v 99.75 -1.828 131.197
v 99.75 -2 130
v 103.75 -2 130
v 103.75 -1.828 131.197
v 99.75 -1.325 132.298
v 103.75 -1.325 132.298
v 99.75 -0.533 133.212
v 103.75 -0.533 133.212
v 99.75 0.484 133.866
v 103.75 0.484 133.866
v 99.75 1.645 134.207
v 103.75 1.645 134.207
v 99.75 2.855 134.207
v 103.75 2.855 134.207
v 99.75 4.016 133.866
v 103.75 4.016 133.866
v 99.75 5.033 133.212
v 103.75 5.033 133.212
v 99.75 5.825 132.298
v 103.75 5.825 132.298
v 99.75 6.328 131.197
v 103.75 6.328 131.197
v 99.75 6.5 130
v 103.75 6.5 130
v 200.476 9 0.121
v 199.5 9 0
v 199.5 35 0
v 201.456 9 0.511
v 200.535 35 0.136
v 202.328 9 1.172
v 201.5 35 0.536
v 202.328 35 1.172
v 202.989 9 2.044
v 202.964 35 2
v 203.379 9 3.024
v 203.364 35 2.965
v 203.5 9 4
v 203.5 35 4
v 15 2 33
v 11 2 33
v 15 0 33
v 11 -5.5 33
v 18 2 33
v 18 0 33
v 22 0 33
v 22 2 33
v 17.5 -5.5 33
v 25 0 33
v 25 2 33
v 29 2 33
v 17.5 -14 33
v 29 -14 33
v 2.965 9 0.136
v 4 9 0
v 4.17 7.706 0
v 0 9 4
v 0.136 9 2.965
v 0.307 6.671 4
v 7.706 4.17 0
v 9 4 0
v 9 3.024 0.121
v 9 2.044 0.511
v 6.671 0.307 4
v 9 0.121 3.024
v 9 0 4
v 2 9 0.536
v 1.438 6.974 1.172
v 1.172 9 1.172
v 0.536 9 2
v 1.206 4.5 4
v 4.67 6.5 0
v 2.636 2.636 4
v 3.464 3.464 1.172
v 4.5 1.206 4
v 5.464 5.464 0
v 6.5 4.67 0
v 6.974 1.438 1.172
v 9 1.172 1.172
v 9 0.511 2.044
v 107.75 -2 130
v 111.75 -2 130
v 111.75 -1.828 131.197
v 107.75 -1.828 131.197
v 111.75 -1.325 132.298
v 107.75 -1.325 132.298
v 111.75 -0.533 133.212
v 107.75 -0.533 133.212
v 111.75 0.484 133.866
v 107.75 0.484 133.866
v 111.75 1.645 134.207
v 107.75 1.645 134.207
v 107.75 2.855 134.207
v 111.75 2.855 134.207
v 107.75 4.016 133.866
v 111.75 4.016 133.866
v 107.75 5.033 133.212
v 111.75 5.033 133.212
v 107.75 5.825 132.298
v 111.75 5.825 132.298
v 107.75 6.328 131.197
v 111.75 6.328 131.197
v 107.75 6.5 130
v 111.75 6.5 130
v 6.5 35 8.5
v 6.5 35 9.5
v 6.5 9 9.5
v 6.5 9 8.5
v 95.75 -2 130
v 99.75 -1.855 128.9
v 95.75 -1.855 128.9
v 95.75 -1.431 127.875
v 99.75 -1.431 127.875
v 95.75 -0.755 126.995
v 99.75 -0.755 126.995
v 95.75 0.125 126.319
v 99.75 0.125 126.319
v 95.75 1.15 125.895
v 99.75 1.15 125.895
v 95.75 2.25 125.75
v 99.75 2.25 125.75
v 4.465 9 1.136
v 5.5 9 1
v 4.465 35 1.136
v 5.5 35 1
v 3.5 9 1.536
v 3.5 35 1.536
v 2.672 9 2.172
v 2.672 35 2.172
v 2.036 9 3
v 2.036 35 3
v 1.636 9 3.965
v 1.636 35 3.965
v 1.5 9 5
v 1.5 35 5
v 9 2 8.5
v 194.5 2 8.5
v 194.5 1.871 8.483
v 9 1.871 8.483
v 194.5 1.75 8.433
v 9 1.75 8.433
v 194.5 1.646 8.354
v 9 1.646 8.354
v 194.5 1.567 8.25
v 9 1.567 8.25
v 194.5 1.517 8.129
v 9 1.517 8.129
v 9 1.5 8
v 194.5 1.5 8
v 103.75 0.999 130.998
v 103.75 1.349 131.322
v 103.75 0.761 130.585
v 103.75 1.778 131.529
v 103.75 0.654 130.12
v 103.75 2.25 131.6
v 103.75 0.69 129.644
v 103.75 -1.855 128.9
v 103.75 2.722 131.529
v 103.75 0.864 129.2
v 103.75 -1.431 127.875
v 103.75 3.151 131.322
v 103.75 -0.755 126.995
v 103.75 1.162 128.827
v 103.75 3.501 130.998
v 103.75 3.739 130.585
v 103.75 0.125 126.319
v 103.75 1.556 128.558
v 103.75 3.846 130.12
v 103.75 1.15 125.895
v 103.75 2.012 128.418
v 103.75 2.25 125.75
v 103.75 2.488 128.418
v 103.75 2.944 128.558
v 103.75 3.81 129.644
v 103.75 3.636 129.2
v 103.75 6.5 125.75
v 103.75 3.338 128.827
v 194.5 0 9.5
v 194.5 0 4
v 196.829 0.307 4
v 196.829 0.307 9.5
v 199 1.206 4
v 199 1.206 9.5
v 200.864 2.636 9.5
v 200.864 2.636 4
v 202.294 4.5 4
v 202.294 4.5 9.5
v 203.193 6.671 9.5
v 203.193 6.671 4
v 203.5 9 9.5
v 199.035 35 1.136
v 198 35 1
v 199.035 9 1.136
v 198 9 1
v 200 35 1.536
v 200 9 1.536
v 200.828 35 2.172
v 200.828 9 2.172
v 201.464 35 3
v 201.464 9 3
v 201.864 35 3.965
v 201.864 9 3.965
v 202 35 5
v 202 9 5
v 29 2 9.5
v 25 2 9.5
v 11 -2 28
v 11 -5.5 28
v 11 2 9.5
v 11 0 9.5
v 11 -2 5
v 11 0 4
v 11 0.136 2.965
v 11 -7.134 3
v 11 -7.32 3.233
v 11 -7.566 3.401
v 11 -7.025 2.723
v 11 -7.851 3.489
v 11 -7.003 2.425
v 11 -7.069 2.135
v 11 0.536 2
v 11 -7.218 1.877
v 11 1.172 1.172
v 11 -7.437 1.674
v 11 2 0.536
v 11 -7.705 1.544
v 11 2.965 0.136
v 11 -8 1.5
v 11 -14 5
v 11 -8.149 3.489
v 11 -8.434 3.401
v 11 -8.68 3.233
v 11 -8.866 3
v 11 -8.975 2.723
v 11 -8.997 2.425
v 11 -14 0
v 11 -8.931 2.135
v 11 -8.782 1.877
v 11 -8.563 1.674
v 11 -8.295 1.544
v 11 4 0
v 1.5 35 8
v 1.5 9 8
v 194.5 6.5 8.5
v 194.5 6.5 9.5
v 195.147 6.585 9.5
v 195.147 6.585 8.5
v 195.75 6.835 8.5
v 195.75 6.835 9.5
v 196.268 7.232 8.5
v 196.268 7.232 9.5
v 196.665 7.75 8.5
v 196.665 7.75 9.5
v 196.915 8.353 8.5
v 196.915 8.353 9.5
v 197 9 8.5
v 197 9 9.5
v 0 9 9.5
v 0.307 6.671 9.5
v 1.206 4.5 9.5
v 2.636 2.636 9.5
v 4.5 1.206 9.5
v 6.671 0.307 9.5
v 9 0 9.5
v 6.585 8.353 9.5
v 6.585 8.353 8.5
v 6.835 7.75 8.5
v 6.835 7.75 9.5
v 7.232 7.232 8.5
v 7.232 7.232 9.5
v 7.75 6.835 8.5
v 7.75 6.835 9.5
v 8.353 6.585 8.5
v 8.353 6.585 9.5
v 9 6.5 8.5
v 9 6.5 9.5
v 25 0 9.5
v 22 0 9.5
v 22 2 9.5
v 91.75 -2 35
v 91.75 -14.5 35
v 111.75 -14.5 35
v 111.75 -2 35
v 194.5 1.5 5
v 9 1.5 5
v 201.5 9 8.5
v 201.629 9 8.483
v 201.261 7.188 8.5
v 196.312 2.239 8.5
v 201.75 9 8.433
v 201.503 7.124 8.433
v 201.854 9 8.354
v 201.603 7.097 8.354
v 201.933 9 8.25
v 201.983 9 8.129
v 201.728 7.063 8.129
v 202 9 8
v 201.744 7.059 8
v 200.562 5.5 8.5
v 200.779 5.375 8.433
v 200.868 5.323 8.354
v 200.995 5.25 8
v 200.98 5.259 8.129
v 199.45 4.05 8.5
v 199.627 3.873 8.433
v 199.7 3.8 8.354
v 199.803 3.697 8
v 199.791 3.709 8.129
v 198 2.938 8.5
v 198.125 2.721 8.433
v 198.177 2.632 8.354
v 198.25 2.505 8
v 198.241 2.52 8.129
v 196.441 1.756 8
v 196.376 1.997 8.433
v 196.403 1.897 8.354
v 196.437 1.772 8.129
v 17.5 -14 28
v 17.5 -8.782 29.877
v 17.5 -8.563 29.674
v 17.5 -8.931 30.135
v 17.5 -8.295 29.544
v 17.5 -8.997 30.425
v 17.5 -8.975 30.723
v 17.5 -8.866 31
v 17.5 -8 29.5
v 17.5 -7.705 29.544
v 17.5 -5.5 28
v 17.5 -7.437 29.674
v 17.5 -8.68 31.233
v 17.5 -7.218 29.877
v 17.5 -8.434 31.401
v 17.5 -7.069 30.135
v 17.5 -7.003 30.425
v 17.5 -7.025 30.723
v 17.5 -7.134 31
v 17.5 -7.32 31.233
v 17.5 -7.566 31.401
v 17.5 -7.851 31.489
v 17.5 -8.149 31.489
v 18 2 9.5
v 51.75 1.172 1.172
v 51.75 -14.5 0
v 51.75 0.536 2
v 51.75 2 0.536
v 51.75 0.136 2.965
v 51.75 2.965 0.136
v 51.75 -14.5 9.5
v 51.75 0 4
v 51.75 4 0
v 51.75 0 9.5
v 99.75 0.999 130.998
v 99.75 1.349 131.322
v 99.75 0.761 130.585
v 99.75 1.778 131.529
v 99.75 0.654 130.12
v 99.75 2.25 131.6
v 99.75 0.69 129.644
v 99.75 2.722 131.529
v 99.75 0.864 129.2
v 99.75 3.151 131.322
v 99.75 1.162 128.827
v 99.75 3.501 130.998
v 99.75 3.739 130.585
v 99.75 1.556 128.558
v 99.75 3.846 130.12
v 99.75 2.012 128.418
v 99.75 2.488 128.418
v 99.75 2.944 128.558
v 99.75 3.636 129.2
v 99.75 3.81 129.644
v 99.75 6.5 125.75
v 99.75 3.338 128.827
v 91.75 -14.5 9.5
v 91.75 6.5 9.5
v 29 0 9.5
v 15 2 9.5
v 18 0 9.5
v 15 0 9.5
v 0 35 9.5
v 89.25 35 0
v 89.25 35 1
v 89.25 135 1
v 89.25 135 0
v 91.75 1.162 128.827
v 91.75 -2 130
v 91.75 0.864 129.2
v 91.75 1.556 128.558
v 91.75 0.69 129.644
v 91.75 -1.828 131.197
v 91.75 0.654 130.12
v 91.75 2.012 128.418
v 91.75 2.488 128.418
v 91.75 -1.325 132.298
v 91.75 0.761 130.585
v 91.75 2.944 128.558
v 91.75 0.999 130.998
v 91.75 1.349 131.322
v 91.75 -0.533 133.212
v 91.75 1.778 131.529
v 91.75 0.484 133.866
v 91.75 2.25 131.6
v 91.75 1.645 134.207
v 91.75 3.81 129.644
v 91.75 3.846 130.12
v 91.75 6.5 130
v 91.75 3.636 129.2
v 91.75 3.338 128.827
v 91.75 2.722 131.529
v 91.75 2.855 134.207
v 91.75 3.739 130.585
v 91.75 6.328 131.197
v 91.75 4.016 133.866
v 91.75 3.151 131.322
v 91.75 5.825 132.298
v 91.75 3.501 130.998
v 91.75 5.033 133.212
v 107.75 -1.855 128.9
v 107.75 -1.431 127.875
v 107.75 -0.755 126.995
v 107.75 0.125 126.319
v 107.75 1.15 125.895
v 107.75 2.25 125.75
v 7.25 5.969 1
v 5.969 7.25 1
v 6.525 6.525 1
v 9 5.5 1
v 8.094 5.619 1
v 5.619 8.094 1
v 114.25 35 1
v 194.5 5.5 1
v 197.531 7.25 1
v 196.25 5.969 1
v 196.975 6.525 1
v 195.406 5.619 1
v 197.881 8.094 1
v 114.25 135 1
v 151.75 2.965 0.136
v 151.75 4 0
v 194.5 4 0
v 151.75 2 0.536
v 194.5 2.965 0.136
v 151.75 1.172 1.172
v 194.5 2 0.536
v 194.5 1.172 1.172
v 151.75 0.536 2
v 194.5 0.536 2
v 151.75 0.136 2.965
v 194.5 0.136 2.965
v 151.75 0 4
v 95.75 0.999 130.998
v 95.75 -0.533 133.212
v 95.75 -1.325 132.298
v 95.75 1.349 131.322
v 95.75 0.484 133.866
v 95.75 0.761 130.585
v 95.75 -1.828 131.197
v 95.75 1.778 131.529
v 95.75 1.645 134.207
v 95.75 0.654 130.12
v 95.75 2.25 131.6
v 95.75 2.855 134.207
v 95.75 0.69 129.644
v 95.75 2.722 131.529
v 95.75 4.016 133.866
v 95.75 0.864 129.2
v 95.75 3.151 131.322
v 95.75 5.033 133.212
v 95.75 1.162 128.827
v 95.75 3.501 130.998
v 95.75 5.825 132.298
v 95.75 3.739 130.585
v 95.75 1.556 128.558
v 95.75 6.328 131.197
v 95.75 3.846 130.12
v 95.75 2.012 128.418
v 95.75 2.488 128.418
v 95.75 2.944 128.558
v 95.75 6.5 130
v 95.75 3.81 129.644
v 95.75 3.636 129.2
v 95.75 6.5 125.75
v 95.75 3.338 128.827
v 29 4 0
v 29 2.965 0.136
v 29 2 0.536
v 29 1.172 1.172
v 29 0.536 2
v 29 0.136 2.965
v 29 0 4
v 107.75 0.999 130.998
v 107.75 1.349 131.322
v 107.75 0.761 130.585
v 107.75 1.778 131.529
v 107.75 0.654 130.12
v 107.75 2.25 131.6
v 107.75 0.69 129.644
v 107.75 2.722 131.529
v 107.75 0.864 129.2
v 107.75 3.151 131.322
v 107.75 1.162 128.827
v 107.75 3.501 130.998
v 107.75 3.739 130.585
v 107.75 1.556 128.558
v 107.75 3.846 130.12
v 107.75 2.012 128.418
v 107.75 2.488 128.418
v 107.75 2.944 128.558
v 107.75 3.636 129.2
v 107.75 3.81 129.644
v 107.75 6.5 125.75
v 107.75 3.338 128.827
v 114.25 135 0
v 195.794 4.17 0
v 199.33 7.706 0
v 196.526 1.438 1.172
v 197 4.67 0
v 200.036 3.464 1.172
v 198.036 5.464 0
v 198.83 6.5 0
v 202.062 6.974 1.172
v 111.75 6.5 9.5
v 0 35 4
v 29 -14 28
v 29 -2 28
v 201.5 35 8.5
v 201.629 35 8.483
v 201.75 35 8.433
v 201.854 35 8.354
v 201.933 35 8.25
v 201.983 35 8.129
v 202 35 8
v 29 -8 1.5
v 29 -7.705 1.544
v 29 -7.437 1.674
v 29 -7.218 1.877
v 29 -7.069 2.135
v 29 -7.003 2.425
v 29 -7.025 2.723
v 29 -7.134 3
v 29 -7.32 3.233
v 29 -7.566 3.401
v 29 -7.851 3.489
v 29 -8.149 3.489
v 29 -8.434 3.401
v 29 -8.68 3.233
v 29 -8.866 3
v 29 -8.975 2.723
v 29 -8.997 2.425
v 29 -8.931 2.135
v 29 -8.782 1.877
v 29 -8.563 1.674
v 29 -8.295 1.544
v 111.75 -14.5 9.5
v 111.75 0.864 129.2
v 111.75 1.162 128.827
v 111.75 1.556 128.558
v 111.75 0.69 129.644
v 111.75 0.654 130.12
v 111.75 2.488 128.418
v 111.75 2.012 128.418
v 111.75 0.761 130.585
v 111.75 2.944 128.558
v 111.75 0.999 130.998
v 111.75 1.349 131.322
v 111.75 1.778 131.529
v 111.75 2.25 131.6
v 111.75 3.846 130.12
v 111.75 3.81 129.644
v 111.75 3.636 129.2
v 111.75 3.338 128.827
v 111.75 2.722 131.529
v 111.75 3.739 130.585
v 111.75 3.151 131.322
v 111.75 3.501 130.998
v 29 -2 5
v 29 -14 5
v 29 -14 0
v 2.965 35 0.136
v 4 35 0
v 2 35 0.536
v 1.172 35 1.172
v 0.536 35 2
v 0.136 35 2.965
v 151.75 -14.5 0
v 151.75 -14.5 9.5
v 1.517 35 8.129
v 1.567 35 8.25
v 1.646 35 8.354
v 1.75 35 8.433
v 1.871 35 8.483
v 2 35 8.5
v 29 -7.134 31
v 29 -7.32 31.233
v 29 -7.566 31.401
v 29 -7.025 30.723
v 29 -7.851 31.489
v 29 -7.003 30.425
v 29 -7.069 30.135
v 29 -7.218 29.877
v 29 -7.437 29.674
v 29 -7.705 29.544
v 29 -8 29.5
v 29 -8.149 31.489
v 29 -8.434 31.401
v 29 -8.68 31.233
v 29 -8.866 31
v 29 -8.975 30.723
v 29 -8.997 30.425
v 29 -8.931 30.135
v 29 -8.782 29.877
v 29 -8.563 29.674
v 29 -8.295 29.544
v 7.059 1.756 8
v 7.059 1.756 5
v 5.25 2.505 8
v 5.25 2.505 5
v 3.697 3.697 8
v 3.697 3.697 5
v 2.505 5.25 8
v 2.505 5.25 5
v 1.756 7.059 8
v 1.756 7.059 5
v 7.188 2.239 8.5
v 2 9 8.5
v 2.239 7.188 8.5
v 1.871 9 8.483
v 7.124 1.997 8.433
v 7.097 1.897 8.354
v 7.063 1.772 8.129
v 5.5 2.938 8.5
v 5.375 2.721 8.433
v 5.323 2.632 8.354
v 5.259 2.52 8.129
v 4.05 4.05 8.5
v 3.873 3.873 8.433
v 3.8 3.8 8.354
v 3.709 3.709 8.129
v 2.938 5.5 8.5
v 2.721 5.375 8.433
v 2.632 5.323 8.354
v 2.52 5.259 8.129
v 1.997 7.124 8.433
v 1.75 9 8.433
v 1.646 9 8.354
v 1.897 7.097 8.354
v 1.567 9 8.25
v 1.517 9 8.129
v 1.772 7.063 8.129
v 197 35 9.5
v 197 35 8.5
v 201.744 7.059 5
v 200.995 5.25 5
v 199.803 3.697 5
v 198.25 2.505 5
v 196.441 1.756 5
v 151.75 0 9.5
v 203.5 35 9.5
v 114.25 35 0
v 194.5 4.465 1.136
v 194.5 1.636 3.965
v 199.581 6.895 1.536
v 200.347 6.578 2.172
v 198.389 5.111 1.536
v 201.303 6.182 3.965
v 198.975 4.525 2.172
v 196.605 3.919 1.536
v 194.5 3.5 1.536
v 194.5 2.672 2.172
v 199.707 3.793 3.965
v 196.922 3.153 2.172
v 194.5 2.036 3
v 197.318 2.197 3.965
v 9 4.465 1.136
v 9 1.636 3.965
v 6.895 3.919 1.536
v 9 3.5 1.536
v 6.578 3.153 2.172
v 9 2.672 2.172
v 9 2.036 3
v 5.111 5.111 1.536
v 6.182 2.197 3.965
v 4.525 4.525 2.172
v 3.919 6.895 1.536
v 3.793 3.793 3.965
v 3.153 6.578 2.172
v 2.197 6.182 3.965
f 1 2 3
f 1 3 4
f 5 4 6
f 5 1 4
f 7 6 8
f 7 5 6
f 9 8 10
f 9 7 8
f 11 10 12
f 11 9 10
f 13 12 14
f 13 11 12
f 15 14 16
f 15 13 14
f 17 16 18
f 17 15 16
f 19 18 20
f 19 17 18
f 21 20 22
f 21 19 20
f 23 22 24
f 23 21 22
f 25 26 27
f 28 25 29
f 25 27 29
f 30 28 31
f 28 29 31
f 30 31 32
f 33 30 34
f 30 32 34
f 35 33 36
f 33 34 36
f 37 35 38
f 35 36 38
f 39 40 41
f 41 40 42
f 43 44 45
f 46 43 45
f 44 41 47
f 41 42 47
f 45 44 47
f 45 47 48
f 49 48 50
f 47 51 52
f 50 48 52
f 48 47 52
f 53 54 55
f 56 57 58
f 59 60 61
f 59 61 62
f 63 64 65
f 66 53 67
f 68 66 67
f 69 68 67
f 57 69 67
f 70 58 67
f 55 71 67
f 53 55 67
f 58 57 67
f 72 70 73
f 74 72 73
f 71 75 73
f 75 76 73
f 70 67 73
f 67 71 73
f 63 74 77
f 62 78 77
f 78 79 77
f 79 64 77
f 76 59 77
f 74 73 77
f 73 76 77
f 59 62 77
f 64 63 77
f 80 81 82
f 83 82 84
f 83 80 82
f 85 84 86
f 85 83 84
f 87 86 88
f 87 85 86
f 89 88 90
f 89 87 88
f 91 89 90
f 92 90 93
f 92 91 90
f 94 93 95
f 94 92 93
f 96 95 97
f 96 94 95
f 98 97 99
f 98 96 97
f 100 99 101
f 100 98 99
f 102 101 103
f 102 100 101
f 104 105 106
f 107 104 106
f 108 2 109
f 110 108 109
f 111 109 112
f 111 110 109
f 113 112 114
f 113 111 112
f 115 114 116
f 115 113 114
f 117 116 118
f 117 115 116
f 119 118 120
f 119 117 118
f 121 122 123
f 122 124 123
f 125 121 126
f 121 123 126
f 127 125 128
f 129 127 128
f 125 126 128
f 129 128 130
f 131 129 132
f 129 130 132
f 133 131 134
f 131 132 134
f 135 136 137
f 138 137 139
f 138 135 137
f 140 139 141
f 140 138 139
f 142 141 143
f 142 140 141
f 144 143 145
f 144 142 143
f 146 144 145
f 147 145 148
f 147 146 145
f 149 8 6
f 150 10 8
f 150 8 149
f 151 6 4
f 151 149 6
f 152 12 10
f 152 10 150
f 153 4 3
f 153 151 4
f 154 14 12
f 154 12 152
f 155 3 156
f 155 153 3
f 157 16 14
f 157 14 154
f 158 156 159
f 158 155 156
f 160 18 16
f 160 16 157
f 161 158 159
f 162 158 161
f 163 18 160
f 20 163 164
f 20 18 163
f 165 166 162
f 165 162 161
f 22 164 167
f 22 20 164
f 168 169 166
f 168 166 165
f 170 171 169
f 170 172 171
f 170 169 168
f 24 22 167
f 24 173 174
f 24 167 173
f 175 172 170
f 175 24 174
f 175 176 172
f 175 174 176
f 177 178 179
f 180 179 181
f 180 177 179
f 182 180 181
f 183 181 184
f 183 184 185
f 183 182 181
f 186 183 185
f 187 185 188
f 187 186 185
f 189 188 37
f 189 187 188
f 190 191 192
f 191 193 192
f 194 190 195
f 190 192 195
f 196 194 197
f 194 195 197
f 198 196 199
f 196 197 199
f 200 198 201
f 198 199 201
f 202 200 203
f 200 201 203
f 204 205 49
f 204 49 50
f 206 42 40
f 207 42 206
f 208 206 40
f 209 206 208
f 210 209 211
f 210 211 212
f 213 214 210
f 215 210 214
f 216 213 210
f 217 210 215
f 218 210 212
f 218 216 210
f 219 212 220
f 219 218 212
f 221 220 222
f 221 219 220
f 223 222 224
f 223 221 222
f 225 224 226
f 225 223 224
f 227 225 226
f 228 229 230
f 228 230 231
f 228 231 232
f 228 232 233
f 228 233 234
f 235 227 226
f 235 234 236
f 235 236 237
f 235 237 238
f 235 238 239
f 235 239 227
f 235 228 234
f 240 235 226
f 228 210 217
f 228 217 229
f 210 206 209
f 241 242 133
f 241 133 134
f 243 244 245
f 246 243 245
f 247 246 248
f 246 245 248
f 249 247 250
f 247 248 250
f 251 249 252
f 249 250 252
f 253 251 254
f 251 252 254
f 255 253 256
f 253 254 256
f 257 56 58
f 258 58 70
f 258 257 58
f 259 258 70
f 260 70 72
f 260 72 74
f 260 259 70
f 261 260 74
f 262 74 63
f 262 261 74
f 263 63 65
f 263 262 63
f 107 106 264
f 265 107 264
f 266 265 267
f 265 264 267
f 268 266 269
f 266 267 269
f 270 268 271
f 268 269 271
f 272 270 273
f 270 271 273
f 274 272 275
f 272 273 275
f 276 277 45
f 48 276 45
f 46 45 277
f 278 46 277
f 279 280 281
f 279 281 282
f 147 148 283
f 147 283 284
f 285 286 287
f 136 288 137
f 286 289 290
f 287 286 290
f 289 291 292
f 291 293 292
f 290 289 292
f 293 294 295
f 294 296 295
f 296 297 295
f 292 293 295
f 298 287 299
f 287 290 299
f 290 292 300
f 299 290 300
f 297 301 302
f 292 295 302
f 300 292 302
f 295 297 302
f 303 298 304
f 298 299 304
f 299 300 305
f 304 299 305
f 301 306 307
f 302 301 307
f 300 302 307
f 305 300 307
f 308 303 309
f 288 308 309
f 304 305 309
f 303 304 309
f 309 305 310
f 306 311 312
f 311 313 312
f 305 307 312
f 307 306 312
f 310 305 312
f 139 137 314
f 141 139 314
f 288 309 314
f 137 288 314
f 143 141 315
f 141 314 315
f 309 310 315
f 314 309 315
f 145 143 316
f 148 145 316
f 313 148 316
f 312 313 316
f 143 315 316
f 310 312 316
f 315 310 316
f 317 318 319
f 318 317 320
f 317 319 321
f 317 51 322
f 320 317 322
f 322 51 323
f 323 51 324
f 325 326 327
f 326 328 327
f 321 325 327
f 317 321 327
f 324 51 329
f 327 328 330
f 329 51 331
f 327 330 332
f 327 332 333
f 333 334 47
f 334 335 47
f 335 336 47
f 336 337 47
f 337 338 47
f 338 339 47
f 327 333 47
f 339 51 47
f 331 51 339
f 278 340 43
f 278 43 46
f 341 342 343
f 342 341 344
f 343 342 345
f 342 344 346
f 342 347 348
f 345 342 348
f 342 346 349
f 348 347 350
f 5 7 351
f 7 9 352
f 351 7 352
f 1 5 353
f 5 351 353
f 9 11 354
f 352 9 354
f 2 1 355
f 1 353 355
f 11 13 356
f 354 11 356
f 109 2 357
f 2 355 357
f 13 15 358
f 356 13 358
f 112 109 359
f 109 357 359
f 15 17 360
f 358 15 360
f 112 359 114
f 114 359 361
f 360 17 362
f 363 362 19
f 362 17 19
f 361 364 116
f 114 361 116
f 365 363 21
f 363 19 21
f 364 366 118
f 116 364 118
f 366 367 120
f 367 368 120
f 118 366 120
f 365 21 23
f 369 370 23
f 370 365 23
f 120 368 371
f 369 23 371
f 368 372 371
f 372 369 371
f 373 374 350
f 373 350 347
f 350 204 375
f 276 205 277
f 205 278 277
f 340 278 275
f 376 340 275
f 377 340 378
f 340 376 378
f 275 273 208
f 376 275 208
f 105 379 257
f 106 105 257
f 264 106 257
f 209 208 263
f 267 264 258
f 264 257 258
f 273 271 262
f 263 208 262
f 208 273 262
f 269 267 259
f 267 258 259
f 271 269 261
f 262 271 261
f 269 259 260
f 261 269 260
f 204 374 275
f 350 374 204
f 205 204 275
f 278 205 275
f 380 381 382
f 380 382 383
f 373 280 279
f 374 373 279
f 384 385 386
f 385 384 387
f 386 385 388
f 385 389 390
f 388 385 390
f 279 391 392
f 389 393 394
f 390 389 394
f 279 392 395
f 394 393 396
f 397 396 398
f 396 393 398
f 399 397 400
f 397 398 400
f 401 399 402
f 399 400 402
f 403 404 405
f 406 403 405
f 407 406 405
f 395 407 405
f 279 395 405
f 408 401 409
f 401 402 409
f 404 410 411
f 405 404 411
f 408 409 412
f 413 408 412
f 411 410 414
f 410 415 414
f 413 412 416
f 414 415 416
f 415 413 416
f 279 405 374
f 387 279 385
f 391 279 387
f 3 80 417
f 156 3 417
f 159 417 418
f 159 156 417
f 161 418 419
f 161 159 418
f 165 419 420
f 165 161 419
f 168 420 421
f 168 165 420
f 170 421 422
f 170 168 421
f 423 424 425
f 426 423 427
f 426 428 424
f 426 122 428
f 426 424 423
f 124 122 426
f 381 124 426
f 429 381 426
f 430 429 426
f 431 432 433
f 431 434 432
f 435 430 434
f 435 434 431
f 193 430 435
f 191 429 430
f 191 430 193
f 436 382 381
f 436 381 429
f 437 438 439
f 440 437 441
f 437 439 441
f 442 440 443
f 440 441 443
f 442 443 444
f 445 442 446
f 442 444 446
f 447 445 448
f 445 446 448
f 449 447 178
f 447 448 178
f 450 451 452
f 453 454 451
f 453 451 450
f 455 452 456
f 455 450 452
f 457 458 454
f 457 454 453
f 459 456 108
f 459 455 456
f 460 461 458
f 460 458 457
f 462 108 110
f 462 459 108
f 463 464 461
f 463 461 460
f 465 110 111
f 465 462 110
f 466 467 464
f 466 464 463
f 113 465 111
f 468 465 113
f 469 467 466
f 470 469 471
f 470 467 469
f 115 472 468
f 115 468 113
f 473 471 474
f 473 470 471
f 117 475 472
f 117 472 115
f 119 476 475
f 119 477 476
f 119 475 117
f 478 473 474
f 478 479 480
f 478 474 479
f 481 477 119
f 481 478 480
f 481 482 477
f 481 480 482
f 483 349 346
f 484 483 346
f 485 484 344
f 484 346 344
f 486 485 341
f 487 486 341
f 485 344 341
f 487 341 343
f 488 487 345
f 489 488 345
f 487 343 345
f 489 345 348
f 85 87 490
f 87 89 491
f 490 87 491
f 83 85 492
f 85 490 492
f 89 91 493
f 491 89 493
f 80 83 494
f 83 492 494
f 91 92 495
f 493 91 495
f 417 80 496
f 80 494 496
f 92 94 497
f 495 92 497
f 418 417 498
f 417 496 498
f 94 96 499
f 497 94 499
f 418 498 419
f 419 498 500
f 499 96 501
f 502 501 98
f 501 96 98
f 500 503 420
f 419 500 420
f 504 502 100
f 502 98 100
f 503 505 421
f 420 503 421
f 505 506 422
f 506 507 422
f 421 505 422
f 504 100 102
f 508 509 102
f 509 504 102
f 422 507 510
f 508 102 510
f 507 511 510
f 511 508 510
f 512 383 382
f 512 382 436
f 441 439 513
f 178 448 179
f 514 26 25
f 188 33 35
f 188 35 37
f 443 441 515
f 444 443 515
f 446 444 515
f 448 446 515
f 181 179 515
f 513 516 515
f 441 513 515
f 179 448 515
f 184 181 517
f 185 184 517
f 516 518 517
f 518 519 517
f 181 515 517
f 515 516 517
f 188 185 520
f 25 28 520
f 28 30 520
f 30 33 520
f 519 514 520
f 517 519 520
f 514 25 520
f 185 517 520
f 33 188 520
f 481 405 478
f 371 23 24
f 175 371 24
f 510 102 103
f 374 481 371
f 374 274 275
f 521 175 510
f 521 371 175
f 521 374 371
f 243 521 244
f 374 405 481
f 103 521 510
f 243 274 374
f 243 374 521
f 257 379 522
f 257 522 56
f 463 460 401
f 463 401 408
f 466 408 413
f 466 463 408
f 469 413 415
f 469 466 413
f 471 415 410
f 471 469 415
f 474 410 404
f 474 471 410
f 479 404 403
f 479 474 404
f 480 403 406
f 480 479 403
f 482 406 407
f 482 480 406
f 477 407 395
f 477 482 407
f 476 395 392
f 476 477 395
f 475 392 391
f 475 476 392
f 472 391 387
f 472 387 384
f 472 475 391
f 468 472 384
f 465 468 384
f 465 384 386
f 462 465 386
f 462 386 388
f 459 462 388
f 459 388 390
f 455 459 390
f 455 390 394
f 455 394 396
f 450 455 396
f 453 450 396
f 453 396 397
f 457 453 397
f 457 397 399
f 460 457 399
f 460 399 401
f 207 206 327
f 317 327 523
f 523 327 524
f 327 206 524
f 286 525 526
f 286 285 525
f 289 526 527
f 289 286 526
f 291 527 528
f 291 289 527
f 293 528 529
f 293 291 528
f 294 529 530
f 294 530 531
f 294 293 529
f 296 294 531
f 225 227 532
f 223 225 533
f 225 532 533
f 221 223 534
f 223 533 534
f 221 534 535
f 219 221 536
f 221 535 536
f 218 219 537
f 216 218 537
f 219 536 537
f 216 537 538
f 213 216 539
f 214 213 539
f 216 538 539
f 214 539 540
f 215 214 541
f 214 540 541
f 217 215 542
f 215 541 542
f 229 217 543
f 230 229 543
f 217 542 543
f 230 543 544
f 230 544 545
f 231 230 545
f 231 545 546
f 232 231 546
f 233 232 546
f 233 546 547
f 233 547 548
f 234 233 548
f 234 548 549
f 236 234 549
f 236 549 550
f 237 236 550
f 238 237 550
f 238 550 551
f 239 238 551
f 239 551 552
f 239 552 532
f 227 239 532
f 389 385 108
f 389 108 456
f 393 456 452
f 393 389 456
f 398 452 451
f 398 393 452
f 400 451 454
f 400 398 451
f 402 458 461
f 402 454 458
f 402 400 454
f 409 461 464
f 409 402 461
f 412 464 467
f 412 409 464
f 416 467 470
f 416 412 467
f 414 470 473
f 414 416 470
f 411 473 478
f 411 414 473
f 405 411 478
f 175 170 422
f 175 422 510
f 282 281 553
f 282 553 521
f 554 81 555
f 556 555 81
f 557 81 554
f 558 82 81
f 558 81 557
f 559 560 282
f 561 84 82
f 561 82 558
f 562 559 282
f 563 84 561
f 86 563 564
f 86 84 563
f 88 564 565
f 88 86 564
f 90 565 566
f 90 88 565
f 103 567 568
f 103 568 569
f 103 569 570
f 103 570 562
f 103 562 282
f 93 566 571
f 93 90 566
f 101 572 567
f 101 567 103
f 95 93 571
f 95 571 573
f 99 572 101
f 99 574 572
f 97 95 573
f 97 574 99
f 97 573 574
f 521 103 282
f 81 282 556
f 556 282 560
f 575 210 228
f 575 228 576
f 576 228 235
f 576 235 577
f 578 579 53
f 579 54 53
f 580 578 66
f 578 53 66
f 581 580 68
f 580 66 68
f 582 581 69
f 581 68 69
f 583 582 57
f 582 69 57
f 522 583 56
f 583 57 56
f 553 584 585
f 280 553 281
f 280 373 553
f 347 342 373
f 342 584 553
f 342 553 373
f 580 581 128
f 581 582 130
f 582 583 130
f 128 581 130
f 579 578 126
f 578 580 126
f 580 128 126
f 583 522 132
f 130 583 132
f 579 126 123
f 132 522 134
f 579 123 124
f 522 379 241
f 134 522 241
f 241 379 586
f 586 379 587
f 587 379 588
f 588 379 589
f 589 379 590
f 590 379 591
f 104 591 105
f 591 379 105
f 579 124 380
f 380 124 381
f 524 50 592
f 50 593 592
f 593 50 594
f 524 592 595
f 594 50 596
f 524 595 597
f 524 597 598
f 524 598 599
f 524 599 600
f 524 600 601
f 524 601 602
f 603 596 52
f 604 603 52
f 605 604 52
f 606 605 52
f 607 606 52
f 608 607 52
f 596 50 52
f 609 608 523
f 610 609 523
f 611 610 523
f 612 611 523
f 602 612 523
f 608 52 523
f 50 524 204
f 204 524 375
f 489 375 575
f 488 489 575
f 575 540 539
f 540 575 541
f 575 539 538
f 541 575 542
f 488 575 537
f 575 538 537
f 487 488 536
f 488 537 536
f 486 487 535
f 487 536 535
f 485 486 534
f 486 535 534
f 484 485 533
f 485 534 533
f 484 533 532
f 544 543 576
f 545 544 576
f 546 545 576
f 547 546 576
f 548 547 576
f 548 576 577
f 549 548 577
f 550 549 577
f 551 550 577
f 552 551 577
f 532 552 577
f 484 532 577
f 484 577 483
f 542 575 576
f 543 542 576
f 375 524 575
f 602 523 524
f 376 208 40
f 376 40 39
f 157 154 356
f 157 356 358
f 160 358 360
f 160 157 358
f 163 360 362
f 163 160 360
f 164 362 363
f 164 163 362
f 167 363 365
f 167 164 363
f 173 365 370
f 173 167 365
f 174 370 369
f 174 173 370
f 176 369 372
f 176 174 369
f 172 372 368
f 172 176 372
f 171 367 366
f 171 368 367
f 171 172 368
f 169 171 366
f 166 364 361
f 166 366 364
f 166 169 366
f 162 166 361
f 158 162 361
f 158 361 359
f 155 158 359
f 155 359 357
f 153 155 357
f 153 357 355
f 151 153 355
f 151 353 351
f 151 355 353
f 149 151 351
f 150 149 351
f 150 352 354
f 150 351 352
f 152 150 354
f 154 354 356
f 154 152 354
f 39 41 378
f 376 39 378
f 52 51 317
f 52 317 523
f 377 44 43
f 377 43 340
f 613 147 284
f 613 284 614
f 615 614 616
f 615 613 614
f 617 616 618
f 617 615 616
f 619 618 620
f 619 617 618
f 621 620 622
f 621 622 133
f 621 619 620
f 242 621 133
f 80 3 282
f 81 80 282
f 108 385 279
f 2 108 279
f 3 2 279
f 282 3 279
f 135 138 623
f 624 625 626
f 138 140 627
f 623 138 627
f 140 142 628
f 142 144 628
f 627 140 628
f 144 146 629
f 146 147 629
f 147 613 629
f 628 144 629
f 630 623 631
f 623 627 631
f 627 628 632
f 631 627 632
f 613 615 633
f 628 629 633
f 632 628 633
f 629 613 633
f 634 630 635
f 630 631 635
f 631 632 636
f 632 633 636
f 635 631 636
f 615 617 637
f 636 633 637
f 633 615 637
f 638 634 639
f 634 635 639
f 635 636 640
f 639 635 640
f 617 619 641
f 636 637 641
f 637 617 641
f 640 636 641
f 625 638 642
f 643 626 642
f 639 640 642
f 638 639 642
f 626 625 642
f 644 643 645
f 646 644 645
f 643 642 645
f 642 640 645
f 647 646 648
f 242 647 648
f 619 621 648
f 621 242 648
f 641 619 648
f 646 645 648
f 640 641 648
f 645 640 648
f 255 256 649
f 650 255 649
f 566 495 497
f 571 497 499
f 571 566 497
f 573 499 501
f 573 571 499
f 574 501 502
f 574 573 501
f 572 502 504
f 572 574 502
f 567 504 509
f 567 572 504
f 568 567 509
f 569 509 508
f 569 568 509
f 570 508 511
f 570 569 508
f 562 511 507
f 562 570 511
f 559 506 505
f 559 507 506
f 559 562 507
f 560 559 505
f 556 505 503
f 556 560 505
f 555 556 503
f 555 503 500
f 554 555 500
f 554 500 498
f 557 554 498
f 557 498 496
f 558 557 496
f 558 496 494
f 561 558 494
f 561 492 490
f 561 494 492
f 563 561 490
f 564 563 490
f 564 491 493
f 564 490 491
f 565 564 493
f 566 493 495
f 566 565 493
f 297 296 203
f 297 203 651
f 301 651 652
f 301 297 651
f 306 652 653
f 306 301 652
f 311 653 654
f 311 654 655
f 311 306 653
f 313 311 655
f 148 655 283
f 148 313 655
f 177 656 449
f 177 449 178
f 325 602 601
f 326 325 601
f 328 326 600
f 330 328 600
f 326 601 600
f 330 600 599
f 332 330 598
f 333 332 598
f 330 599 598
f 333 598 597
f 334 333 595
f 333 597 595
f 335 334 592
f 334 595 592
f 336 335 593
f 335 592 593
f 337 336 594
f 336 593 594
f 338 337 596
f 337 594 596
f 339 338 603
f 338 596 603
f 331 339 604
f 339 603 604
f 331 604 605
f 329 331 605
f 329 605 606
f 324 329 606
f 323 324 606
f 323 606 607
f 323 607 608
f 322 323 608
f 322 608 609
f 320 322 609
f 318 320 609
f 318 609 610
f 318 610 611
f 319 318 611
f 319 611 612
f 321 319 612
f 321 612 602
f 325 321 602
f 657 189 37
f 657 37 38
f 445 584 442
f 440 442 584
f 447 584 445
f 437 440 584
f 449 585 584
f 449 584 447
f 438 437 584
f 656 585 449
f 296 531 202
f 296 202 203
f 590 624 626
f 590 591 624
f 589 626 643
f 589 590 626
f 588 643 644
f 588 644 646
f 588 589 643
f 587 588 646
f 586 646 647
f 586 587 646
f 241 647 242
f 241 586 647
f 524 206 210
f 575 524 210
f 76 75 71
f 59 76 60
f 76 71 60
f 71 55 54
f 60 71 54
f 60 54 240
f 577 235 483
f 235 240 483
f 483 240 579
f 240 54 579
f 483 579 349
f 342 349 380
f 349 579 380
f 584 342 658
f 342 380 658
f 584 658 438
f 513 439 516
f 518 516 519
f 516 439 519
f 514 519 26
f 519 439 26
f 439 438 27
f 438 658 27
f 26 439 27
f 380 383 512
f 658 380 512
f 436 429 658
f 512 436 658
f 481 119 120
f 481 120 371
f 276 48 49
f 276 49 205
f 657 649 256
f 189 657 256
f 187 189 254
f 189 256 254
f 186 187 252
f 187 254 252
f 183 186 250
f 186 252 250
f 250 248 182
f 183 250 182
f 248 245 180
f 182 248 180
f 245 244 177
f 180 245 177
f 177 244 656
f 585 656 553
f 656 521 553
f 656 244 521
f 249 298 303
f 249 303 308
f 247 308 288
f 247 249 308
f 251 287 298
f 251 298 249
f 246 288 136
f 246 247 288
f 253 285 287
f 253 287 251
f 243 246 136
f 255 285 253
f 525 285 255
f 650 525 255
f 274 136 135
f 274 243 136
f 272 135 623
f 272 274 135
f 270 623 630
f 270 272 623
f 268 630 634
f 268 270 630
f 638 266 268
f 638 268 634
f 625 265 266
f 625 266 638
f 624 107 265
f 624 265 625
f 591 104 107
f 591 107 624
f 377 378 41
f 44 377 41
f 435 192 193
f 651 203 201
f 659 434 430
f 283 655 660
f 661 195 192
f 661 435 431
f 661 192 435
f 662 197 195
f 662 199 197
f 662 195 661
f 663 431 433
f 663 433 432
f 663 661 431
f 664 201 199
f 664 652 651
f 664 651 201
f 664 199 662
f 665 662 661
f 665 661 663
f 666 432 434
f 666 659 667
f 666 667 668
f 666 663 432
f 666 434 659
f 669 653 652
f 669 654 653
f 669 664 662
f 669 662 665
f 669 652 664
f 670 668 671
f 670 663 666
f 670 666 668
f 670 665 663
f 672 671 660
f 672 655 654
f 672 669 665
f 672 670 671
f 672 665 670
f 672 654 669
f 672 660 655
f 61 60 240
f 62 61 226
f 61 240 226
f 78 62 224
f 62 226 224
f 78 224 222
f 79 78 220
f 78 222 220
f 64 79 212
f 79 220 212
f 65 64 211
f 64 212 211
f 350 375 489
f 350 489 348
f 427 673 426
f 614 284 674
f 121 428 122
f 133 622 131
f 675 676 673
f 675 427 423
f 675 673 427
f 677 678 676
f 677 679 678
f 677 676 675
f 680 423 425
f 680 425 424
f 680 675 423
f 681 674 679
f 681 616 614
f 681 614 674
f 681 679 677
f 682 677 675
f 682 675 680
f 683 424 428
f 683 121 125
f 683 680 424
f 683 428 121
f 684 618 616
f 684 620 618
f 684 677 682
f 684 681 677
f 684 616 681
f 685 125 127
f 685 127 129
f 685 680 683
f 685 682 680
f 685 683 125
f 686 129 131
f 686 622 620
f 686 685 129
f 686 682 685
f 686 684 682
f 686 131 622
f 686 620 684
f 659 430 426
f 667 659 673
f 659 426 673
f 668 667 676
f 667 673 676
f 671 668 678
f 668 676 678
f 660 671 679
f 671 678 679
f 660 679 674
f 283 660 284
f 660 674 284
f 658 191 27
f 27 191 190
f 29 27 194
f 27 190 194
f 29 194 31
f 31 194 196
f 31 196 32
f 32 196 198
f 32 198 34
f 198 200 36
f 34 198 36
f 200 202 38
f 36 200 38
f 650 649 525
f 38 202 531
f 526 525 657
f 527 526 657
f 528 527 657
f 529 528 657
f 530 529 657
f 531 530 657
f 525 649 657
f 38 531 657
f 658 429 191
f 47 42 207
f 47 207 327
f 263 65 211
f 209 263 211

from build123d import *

# Parameters (mm, degrees)
ESQUISSE1_W                    = 203.5
ESQUISSE1_H                    = 35
BOSS_EXTRU_1_DEPTH             = 1
CONG_1_R                       = 9
BOSS_EXTRU_2_START             = 8.5
BOSS_EXTRU_2_DEPTH             = 8.5
BOSS_EXTRU_3_DEPTH             = 1
CONG_2_R                       = 4
CONG_3_R                       = 0.5
BOSS_EXTRU_4_START             = 91.75
BOSS_EXTRU_4_DEPTH             = 20
ESQUISSE8_W                    = 20
ESQUISSE8_H                    = 120.5
BOSS_EXTRU_5_DEPTH             = 6.5
ESQUISSE9_R                    = 4.25
BOSS_EXTRU_6_DEPTH             = 20
BOSS_EXTRU_10_START            = 51.75
BOSS_EXTRU_10_DEPTH            = 100
BOSS_EXTRU_10_START_2          = 91.75
BOSS_EXTRU_10_2_OUTLINE_W      = 12.5
BOSS_EXTRU_10_2_OUTLINE_H      = 25.5
BOSS_EXTRU_10_2_DEPTH          = 20
ESQUISSE21_W                   = 25
ESQUISSE21_H                   = 1
BOSS_EXTRU_11_DEPTH            = 100
ENL_V_MAT_EXTRU_2_DEPTH        = 4
R_P_TITION_LIN_AIRE2_COUNT     = 2
R_P_TITION_LIN_AIRE2_PITCH     = 8
ENL_V_START                    = -20
ESQUISSE12_R                   = 1.6
ENL_V_MAT_EXTRU_4_DEPTH        = 20
BOSS_EXTRU_7_START             = 11
BOSS_EXTRU_7_DEPTH             = 18
ESQUISSE15_W                   = 18
ESQUISSE15_H                   = 5
BOSS_EXTRU_8_DEPTH             = 12
ENL_V_MAT_EXTRU_5_REACH        = 260.26
ESQUISSE16_R                   = 1
ESQUISSE17_W                   = 4
ESQUISSE17_H                   = 23.5
BOSS_EXTRU_9_DEPTH             = 2
R_P_TITION_LIN_AIRE1_COUNT     = 2
R_P_TITION_LIN_AIRE1_PITCH     = 7
R_P_TITION_LIN_AIRE1_COL_COUNT = 2
R_P_TITION_LIN_AIRE1_COL_PITCH = 7
ENL_V_MAT_EXTRU_6_REACH        = 266.365
ESQUISSE18_W                   = 6.5
ESQUISSE18_H                   = 8.5


# Read off the part's stored shape, not the designer's step: Boss.-Extru.4, Boss.-Extru.10, Boss.-Extru.7
with BuildPart() as part:
    # Esquisse1 → Boss.-Extru.1 (new body)
    with BuildSketch(Plane.XY):
        with Locations((101.75, 17.5)):
            Rectangle(ESQUISSE1_W, ESQUISSE1_H)
    extrude(amount=BOSS_EXTRU_1_DEPTH)

    # Congé1
    cong_1_edges = [part.edges().sort_by_distance(p)[0] for p in [
        (203.5, 0, 0.5),
        (0, 0, 0.5),
    ]]
    fillet(cong_1_edges, radius=CONG_1_R)

    # Esquisse3 → Boss.-Extru.2 (add)
    with BuildSketch(Plane.XY.offset(1).offset(BOSS_EXTRU_2_START)):
        with BuildLine():
            Line((1.5, 33.5), (1.5, 35))
            Line((1.5, 35), (0, 35))
            Line((0, 35), (0, 9))
            ThreePointArc((0, 9), (2.636038969, 2.636038969), (9, 0))
            Line((9, 0), (194.5, 0))
            ThreePointArc((194.5, 0), (200.863961031, 2.636038969), (203.5, 9))
            Line((203.5, 9), (203.5, 35))
            Line((203.5, 35), (202, 35))
            Line((202, 35), (202, 33.5))
            Line((202, 33.5), (202, 9))
            ThreePointArc((202, 9), (199.803300859, 3.696699141), (194.5, 1.5))
            Line((194.5, 1.5), (9, 1.5))
            ThreePointArc((9, 1.5), (3.696699141, 3.696699141), (1.5, 9))
            Line((1.5, 9), (1.5, 33.5))
        make_face()
    extrude(amount=-BOSS_EXTRU_2_DEPTH)

    # Esquisse4 → Boss.-Extru.3 (add)
    with BuildSketch(Plane.XY.offset(9.5)):
        with BuildLine():
            Line((6.5, 35), (6.5, 9))
            ThreePointArc((6.5, 9), (7.232233047, 7.232233047), (9, 6.5))
            Line((9, 6.5), (194.5, 6.5))
            ThreePointArc((194.5, 6.5), (196.267766953, 7.232233047), (197, 9))
            Line((197, 9), (197, 35))
            Line((197, 35), (203.5, 35))
            Line((203.5, 35), (203.5, 9))
            ThreePointArc((203.5, 9), (200.863961031, 2.636038969), (194.5, 0))
            Line((194.5, 0), (9, 0))
            ThreePointArc((9, 0), (2.636038969, 2.636038969), (0, 9))
            Line((0, 9), (0, 35))
            Line((0, 35), (6.5, 35))
        make_face()
    extrude(amount=-BOSS_EXTRU_3_DEPTH)

    # Congé2
    cong_2_edges = [part.edges().sort_by_distance(p)[0] for p in [
        (203.5, 22, 0),
        (101.75, 0, 0),
        (2.636038969, 2.636038969, 0),
        (200.863961031, 2.636038969, 0),
        (3.696699141, 3.696699141, 1),
        (101.75, 1.5, 1),
        (199.803300859, 3.696699141, 1),
        (202, 22, 1),
        (1.5, 22, 1),
        (0, 22, 0),
    ]]
    fillet(cong_2_edges, radius=CONG_2_R)

    # Congé3
    cong_3_edges = [part.edges().sort_by_distance(p)[0] for p in [
        (101.75, 1.5, 8.5),
        (1.5, 22, 8.5),
        (3.696699141, 3.696699141, 8.5),
        (199.803300859, 3.696699141, 8.5),
        (202, 22, 8.5),
    ]]
    fillet(cong_3_edges, radius=CONG_3_R)

    # Boss.-Extru.4 outline → Boss.-Extru.4 (add)
    with BuildSketch(Plane.YZ.offset(BOSS_EXTRU_4_START)):
        with BuildLine():
            Line((-2, 130), (-2, 0))
            Line((-2, 0), (4, 0))
            ThreePointArc((4, 0), (1.171572875, 1.171572875), (0, 4))
            Line((0, 4), (0, 130))
            Line((0, 130), (-2, 130))
        make_face()
    extrude(amount=BOSS_EXTRU_4_DEPTH)

    # Esquisse8 → Boss.-Extru.5 (add)
    with BuildSketch(Plane(origin=(0, 0, 0), x_dir=(1, 0, 0), z_dir=(0, 1, 0))):
        with Locations((101.75, -69.75)):
            Rectangle(ESQUISSE8_W, ESQUISSE8_H)
    extrude(amount=BOSS_EXTRU_5_DEPTH)

    # Esquisse9 → Boss.-Extru.6 (add)
    with BuildSketch(Plane.ZY.offset(-91.75)):
        with Locations((130, 2.25)):
            Circle(ESQUISSE9_R)
    extrude(amount=-BOSS_EXTRU_6_DEPTH)

    # Boss.-Extru.10 outline → Boss.-Extru.10 (add)
    with BuildSketch(Plane.YZ.offset(BOSS_EXTRU_10_START)):
        with BuildLine():
            Line((0, 4), (0, 9.5))
            Line((0, 9.5), (-14.5, 9.5))
            Line((-14.5, 9.5), (-14.5, 0))
            Line((-14.5, 0), (4, 0))
            ThreePointArc((4, 0), (1.171572875, 1.171572875), (0, 4))
        make_face()
    extrude(amount=BOSS_EXTRU_10_DEPTH)

    # Boss.-Extru.10 2 outline → Boss.-Extru.10 2 (add)
    with BuildSketch(Plane.YZ.offset(BOSS_EXTRU_10_START_2)):
        with Locations((-8.25, 22.25)):
            Rectangle(BOSS_EXTRU_10_2_OUTLINE_W, BOSS_EXTRU_10_2_OUTLINE_H)
    extrude(amount=BOSS_EXTRU_10_2_DEPTH)

    # Esquisse21 → Boss.-Extru.11 (add)
    with BuildSketch(Plane(origin=(0, 35, 0), x_dir=(1, 0, 0), z_dir=(0, 1, 0))):
        with Locations((101.75, -0.5)):
            Rectangle(ESQUISSE21_W, ESQUISSE21_H)
    extrude(amount=BOSS_EXTRU_11_DEPTH)

    # Esquisse10 → Enlèv. mat.-Extru.2 (cut)
    with BuildSketch(Plane(origin=(95.75, 0, 0), x_dir=(0, 0, -1), z_dir=(1, 0, 0))):
        with BuildLine():
            Line((-125.75, 2.25), (-125.75, 6.5))
            Line((-125.75, 6.5), (-130, 6.5))
            ThreePointArc((-130, 6.5), (-133.00520382, -0.75520382), (-125.75, 2.25))
        make_face()
    enl_v_mat_extru_2 = extrude(amount=ENL_V_MAT_EXTRU_2_DEPTH, mode=Mode.SUBTRACT)

    # Répétition linéaire2: Enlèv. mat.-Extru.2 ×2
    with Locations(*[(i * R_P_TITION_LIN_AIRE2_PITCH, 0, 0) for i in range(1, R_P_TITION_LIN_AIRE2_COUNT)]):
        add(enl_v_mat_extru_2, mode=Mode.SUBTRACT)

    # Esquisse12 → Enlèv. mat.-Extru.4 (cut)
    with BuildSketch(Plane.ZY.offset(-91.75).offset(ENL_V_START)):
        with Locations((130, 2.25)):
            Circle(ESQUISSE12_R)
    extrude(amount=ENL_V_MAT_EXTRU_4_DEPTH, mode=Mode.SUBTRACT)

    # Boss.-Extru.7 outline → Boss.-Extru.7 (add)
    with BuildSketch(Plane.YZ.offset(BOSS_EXTRU_7_START)):
        with BuildLine():
            Line((0, 33), (-2, 33))
            Line((-2, 33), (-2, 0))
            Line((-2, 0), (4, 0))
            ThreePointArc((4, 0), (1.171572875, 1.171572875), (0, 4))
            Line((0, 4), (0, 33))
        make_face()
    extrude(amount=BOSS_EXTRU_7_DEPTH)

    # Esquisse15 → Boss.-Extru.8 (add)
    with BuildSketch(Plane.XZ.offset(2)):
        with Locations((20, 2.5)):
            Rectangle(ESQUISSE15_W, ESQUISSE15_H)
        with Locations((20, 30.5)):
            Rectangle(ESQUISSE15_W, ESQUISSE15_H)
    extrude(amount=BOSS_EXTRU_8_DEPTH)

    # Esquisse16 → Enlèv. mat.-Extru.5 (cut, up to next)
    with BuildSketch(Plane(origin=(29, 0, 0), x_dir=(0, 0, -1), z_dir=(1, 0, 0)), mode=Mode.PRIVATE) as enl_v_mat_extru_5_sk1:
        with Locations((-30.5, -8)):
            Circle(ESQUISSE16_R)
    enl_v_mat_extru_5_tool1 = extrude(enl_v_mat_extru_5_sk1.sketch, amount=-ENL_V_MAT_EXTRU_5_REACH, mode=Mode.PRIVATE) & part.part
    # Esquisse16 → Enlèv. mat.-Extru.5 (cut, up to next)
    with BuildSketch(Plane(origin=(29, 0, 0), x_dir=(0, 0, -1), z_dir=(1, 0, 0)), mode=Mode.PRIVATE) as enl_v_mat_extru_5_sk2:
        with Locations((-2.5, -8)):
            Circle(ESQUISSE16_R)
    enl_v_mat_extru_5_tool2 = extrude(enl_v_mat_extru_5_sk2.sketch, amount=-ENL_V_MAT_EXTRU_5_REACH, mode=Mode.PRIVATE) & part.part
    add(enl_v_mat_extru_5_tool1.solids().sort_by_distance((29, -8, 30.5))[0], mode=Mode.SUBTRACT)
    add(enl_v_mat_extru_5_tool2.solids().sort_by_distance((29, -8, 2.5))[0], mode=Mode.SUBTRACT)

    # Esquisse17 → Boss.-Extru.9 (add)
    with BuildSketch(Plane(origin=(0, 0, 0), x_dir=(1, 0, 0), z_dir=(0, 1, 0))):
        with Locations((20, -21.25)):
            Rectangle(ESQUISSE17_W, ESQUISSE17_H)
    boss_extru_9 = extrude(amount=BOSS_EXTRU_9_DEPTH)

    # Répétition linéaire1: Boss.-Extru.9 ×2
    with Locations(*[(i * R_P_TITION_LIN_AIRE1_PITCH, 0, 0) for i in range(1, R_P_TITION_LIN_AIRE1_COUNT)]):
        add(boss_extru_9)

    # Répétition linéaire1 col: Boss.-Extru.9 ×2
    with Locations(*[(-i * R_P_TITION_LIN_AIRE1_COL_PITCH, 0, 0) for i in range(1, R_P_TITION_LIN_AIRE1_COL_COUNT)]):
        add(boss_extru_9)

    # Esquisse18 → Enlèv. mat.-Extru.6 (cut, up to next)
    with BuildSketch(Plane.XY.offset(33), mode=Mode.PRIVATE) as enl_v_mat_extru_6_sk1:
        with Locations((14.25, -9.75)):
            Rectangle(ESQUISSE18_W, ESQUISSE18_H)
    enl_v_mat_extru_6_tool1 = extrude(enl_v_mat_extru_6_sk1.sketch, amount=-ENL_V_MAT_EXTRU_6_REACH, mode=Mode.PRIVATE) & part.part
    add(enl_v_mat_extru_6_tool1.solids().sort_by_distance((14.25, -9.75, 33))[0], mode=Mode.SUBTRACT)


solid = part.part
